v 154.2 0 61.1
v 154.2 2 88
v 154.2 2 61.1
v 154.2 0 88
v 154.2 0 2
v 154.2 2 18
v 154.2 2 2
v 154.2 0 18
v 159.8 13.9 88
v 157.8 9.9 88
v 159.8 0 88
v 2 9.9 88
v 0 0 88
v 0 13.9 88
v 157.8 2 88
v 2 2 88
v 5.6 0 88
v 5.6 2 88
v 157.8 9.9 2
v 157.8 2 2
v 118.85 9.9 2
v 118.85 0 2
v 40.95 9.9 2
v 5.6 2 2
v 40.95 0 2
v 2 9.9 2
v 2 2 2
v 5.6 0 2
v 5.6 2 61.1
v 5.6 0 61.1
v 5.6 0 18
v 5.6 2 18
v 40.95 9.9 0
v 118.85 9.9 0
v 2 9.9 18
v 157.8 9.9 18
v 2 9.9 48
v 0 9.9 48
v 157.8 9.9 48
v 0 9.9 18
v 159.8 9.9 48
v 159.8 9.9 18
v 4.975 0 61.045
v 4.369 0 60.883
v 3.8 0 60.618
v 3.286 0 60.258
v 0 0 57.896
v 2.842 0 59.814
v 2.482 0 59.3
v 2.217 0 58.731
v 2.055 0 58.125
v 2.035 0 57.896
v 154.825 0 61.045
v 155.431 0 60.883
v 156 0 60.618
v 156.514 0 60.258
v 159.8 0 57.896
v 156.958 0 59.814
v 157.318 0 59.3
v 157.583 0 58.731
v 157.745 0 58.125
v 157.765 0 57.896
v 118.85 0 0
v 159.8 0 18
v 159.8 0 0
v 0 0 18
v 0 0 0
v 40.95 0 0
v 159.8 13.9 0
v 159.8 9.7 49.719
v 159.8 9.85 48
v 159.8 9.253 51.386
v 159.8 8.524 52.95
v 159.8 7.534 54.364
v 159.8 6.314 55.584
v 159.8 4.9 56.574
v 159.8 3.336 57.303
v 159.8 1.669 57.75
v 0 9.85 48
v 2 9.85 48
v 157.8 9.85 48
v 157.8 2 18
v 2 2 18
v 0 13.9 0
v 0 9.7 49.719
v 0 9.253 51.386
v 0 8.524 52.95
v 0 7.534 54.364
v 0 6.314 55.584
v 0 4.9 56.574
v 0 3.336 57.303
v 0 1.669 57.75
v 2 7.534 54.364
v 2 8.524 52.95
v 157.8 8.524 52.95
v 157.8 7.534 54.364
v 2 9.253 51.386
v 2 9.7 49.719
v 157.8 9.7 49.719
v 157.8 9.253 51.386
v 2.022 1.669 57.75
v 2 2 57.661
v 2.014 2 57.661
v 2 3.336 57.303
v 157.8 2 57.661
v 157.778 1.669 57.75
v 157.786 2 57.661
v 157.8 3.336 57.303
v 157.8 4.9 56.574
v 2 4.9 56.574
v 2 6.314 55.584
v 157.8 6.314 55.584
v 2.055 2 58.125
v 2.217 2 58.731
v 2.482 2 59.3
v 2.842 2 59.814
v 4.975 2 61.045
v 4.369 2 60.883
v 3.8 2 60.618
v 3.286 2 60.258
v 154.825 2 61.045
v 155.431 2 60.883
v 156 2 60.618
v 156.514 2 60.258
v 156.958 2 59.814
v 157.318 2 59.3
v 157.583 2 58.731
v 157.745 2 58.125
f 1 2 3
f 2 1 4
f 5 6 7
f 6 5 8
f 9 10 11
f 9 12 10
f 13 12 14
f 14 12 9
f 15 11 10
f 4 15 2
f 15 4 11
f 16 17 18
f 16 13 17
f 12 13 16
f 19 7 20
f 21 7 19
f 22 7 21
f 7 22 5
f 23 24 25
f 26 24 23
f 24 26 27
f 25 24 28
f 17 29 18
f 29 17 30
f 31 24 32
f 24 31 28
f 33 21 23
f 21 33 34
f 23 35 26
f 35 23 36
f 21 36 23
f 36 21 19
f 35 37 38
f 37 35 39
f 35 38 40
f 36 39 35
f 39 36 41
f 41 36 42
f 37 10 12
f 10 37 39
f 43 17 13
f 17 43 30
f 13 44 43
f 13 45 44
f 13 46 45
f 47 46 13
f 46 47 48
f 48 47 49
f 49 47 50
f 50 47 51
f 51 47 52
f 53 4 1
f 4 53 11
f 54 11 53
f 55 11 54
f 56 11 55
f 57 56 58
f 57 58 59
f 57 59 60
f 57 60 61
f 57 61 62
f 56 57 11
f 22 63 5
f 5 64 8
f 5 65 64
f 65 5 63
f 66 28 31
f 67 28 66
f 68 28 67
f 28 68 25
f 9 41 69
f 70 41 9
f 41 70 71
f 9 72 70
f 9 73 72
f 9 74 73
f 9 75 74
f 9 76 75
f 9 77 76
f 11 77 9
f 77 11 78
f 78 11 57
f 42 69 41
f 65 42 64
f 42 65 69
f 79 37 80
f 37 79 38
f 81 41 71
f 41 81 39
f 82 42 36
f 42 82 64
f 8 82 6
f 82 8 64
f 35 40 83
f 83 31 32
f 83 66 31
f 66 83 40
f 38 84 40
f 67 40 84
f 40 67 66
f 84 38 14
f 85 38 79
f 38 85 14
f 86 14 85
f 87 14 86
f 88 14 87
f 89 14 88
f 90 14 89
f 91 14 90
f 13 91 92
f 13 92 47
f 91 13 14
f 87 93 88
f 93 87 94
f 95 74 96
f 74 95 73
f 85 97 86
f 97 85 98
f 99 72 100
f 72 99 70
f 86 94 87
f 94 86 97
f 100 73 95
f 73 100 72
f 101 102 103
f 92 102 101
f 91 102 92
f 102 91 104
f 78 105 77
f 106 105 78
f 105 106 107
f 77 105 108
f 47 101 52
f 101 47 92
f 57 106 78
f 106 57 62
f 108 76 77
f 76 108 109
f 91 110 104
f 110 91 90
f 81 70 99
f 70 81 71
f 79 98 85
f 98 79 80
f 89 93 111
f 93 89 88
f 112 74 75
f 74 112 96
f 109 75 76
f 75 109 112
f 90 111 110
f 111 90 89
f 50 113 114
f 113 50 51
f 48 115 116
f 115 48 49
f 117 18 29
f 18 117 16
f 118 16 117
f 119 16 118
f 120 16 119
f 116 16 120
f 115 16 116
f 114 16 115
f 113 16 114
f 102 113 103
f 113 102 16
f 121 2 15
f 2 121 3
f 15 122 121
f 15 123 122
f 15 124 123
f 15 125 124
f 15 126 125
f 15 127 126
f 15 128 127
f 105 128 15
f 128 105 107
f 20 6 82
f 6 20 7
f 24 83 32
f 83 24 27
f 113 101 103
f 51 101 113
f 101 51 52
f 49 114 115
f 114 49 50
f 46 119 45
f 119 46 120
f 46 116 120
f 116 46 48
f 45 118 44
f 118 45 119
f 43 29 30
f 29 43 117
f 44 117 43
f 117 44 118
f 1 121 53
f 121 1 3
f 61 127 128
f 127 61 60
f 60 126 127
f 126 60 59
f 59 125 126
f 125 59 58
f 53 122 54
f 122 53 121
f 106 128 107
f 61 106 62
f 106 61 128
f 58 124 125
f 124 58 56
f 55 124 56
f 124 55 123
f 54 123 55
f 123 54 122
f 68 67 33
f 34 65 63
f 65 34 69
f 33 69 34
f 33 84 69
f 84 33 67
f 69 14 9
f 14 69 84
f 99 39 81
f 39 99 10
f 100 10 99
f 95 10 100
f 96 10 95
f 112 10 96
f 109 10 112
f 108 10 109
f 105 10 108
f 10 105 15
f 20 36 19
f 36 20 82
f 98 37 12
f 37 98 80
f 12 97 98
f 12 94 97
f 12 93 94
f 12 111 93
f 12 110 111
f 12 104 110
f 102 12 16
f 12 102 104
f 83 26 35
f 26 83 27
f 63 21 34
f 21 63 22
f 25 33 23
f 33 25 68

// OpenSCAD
//Tickness
t=2;
//Thickness hinten
th=4.0; //wegen Kamera
//Toleranz
tow=0.8;
tod=0.8;
//Breite (ohne Tasten, geschlossen)
bg=155+tow;
// Hoehe Klebeband
hk=50+2;
// Hoehe Front
hf=21+1;
// Hoehe Halter
hh=hk*2-18;
//Tiefe breite Seite (geschlossen, ohne Kamera)
tbs=7.1+tod;
//Tiefe schmale Seite ("")
tss=7.1+tod;
//Abstand zum USB-Slot
ausb=3.6;

$fn=36;

module klotz()
{
    cube([bg+t*2,tbs+t+th,hh+t]);
}

sz1=16;
sz2=30;

module slots()
{
    //front
    color("blue")
    
    translate([ausb+t,0,t])
    cube([bg-ausb*2,tbs+t,hh]);
    
    //speakers
    color("orange")
    
    translate([0,0,sz1+t])
    cube([bg+t+t,tbs+t,sz2]);
    
    speaker_z_side();
    
    speaker_z_front();
    
    translate([bg+t-ausb*2-t,0,0])
    speaker_z_front();
}

module slothandy()
{
    color("red")
    
    translate([t,t,t])
    cube([bg,tbs,hh]);
}

difference()
{
    klotz();
    slothandy();
    slots();
    finger();
}

q=tbs*2+t+t;

module speaker_z_side()
{
color("green")
translate([0,tbs/2-th,sz1+sz2+t])
rotate([0,90,0])
    cylinder(h=bg+t*2, d=q);
}

module speaker_z_front()
{
translate([ausb+t,0,sz1+sz2+tbs+ausb])
rotate([270,0,0])
color("gray")
cylinder(h=t, d=ausb*2);
}

bf=bg/2;

module finger()
{
    color("#FF00FF")
    translate([bg/2-bf/2+t,0,0])
    cube([bf,tbs+t,t]);
}

//finger();
